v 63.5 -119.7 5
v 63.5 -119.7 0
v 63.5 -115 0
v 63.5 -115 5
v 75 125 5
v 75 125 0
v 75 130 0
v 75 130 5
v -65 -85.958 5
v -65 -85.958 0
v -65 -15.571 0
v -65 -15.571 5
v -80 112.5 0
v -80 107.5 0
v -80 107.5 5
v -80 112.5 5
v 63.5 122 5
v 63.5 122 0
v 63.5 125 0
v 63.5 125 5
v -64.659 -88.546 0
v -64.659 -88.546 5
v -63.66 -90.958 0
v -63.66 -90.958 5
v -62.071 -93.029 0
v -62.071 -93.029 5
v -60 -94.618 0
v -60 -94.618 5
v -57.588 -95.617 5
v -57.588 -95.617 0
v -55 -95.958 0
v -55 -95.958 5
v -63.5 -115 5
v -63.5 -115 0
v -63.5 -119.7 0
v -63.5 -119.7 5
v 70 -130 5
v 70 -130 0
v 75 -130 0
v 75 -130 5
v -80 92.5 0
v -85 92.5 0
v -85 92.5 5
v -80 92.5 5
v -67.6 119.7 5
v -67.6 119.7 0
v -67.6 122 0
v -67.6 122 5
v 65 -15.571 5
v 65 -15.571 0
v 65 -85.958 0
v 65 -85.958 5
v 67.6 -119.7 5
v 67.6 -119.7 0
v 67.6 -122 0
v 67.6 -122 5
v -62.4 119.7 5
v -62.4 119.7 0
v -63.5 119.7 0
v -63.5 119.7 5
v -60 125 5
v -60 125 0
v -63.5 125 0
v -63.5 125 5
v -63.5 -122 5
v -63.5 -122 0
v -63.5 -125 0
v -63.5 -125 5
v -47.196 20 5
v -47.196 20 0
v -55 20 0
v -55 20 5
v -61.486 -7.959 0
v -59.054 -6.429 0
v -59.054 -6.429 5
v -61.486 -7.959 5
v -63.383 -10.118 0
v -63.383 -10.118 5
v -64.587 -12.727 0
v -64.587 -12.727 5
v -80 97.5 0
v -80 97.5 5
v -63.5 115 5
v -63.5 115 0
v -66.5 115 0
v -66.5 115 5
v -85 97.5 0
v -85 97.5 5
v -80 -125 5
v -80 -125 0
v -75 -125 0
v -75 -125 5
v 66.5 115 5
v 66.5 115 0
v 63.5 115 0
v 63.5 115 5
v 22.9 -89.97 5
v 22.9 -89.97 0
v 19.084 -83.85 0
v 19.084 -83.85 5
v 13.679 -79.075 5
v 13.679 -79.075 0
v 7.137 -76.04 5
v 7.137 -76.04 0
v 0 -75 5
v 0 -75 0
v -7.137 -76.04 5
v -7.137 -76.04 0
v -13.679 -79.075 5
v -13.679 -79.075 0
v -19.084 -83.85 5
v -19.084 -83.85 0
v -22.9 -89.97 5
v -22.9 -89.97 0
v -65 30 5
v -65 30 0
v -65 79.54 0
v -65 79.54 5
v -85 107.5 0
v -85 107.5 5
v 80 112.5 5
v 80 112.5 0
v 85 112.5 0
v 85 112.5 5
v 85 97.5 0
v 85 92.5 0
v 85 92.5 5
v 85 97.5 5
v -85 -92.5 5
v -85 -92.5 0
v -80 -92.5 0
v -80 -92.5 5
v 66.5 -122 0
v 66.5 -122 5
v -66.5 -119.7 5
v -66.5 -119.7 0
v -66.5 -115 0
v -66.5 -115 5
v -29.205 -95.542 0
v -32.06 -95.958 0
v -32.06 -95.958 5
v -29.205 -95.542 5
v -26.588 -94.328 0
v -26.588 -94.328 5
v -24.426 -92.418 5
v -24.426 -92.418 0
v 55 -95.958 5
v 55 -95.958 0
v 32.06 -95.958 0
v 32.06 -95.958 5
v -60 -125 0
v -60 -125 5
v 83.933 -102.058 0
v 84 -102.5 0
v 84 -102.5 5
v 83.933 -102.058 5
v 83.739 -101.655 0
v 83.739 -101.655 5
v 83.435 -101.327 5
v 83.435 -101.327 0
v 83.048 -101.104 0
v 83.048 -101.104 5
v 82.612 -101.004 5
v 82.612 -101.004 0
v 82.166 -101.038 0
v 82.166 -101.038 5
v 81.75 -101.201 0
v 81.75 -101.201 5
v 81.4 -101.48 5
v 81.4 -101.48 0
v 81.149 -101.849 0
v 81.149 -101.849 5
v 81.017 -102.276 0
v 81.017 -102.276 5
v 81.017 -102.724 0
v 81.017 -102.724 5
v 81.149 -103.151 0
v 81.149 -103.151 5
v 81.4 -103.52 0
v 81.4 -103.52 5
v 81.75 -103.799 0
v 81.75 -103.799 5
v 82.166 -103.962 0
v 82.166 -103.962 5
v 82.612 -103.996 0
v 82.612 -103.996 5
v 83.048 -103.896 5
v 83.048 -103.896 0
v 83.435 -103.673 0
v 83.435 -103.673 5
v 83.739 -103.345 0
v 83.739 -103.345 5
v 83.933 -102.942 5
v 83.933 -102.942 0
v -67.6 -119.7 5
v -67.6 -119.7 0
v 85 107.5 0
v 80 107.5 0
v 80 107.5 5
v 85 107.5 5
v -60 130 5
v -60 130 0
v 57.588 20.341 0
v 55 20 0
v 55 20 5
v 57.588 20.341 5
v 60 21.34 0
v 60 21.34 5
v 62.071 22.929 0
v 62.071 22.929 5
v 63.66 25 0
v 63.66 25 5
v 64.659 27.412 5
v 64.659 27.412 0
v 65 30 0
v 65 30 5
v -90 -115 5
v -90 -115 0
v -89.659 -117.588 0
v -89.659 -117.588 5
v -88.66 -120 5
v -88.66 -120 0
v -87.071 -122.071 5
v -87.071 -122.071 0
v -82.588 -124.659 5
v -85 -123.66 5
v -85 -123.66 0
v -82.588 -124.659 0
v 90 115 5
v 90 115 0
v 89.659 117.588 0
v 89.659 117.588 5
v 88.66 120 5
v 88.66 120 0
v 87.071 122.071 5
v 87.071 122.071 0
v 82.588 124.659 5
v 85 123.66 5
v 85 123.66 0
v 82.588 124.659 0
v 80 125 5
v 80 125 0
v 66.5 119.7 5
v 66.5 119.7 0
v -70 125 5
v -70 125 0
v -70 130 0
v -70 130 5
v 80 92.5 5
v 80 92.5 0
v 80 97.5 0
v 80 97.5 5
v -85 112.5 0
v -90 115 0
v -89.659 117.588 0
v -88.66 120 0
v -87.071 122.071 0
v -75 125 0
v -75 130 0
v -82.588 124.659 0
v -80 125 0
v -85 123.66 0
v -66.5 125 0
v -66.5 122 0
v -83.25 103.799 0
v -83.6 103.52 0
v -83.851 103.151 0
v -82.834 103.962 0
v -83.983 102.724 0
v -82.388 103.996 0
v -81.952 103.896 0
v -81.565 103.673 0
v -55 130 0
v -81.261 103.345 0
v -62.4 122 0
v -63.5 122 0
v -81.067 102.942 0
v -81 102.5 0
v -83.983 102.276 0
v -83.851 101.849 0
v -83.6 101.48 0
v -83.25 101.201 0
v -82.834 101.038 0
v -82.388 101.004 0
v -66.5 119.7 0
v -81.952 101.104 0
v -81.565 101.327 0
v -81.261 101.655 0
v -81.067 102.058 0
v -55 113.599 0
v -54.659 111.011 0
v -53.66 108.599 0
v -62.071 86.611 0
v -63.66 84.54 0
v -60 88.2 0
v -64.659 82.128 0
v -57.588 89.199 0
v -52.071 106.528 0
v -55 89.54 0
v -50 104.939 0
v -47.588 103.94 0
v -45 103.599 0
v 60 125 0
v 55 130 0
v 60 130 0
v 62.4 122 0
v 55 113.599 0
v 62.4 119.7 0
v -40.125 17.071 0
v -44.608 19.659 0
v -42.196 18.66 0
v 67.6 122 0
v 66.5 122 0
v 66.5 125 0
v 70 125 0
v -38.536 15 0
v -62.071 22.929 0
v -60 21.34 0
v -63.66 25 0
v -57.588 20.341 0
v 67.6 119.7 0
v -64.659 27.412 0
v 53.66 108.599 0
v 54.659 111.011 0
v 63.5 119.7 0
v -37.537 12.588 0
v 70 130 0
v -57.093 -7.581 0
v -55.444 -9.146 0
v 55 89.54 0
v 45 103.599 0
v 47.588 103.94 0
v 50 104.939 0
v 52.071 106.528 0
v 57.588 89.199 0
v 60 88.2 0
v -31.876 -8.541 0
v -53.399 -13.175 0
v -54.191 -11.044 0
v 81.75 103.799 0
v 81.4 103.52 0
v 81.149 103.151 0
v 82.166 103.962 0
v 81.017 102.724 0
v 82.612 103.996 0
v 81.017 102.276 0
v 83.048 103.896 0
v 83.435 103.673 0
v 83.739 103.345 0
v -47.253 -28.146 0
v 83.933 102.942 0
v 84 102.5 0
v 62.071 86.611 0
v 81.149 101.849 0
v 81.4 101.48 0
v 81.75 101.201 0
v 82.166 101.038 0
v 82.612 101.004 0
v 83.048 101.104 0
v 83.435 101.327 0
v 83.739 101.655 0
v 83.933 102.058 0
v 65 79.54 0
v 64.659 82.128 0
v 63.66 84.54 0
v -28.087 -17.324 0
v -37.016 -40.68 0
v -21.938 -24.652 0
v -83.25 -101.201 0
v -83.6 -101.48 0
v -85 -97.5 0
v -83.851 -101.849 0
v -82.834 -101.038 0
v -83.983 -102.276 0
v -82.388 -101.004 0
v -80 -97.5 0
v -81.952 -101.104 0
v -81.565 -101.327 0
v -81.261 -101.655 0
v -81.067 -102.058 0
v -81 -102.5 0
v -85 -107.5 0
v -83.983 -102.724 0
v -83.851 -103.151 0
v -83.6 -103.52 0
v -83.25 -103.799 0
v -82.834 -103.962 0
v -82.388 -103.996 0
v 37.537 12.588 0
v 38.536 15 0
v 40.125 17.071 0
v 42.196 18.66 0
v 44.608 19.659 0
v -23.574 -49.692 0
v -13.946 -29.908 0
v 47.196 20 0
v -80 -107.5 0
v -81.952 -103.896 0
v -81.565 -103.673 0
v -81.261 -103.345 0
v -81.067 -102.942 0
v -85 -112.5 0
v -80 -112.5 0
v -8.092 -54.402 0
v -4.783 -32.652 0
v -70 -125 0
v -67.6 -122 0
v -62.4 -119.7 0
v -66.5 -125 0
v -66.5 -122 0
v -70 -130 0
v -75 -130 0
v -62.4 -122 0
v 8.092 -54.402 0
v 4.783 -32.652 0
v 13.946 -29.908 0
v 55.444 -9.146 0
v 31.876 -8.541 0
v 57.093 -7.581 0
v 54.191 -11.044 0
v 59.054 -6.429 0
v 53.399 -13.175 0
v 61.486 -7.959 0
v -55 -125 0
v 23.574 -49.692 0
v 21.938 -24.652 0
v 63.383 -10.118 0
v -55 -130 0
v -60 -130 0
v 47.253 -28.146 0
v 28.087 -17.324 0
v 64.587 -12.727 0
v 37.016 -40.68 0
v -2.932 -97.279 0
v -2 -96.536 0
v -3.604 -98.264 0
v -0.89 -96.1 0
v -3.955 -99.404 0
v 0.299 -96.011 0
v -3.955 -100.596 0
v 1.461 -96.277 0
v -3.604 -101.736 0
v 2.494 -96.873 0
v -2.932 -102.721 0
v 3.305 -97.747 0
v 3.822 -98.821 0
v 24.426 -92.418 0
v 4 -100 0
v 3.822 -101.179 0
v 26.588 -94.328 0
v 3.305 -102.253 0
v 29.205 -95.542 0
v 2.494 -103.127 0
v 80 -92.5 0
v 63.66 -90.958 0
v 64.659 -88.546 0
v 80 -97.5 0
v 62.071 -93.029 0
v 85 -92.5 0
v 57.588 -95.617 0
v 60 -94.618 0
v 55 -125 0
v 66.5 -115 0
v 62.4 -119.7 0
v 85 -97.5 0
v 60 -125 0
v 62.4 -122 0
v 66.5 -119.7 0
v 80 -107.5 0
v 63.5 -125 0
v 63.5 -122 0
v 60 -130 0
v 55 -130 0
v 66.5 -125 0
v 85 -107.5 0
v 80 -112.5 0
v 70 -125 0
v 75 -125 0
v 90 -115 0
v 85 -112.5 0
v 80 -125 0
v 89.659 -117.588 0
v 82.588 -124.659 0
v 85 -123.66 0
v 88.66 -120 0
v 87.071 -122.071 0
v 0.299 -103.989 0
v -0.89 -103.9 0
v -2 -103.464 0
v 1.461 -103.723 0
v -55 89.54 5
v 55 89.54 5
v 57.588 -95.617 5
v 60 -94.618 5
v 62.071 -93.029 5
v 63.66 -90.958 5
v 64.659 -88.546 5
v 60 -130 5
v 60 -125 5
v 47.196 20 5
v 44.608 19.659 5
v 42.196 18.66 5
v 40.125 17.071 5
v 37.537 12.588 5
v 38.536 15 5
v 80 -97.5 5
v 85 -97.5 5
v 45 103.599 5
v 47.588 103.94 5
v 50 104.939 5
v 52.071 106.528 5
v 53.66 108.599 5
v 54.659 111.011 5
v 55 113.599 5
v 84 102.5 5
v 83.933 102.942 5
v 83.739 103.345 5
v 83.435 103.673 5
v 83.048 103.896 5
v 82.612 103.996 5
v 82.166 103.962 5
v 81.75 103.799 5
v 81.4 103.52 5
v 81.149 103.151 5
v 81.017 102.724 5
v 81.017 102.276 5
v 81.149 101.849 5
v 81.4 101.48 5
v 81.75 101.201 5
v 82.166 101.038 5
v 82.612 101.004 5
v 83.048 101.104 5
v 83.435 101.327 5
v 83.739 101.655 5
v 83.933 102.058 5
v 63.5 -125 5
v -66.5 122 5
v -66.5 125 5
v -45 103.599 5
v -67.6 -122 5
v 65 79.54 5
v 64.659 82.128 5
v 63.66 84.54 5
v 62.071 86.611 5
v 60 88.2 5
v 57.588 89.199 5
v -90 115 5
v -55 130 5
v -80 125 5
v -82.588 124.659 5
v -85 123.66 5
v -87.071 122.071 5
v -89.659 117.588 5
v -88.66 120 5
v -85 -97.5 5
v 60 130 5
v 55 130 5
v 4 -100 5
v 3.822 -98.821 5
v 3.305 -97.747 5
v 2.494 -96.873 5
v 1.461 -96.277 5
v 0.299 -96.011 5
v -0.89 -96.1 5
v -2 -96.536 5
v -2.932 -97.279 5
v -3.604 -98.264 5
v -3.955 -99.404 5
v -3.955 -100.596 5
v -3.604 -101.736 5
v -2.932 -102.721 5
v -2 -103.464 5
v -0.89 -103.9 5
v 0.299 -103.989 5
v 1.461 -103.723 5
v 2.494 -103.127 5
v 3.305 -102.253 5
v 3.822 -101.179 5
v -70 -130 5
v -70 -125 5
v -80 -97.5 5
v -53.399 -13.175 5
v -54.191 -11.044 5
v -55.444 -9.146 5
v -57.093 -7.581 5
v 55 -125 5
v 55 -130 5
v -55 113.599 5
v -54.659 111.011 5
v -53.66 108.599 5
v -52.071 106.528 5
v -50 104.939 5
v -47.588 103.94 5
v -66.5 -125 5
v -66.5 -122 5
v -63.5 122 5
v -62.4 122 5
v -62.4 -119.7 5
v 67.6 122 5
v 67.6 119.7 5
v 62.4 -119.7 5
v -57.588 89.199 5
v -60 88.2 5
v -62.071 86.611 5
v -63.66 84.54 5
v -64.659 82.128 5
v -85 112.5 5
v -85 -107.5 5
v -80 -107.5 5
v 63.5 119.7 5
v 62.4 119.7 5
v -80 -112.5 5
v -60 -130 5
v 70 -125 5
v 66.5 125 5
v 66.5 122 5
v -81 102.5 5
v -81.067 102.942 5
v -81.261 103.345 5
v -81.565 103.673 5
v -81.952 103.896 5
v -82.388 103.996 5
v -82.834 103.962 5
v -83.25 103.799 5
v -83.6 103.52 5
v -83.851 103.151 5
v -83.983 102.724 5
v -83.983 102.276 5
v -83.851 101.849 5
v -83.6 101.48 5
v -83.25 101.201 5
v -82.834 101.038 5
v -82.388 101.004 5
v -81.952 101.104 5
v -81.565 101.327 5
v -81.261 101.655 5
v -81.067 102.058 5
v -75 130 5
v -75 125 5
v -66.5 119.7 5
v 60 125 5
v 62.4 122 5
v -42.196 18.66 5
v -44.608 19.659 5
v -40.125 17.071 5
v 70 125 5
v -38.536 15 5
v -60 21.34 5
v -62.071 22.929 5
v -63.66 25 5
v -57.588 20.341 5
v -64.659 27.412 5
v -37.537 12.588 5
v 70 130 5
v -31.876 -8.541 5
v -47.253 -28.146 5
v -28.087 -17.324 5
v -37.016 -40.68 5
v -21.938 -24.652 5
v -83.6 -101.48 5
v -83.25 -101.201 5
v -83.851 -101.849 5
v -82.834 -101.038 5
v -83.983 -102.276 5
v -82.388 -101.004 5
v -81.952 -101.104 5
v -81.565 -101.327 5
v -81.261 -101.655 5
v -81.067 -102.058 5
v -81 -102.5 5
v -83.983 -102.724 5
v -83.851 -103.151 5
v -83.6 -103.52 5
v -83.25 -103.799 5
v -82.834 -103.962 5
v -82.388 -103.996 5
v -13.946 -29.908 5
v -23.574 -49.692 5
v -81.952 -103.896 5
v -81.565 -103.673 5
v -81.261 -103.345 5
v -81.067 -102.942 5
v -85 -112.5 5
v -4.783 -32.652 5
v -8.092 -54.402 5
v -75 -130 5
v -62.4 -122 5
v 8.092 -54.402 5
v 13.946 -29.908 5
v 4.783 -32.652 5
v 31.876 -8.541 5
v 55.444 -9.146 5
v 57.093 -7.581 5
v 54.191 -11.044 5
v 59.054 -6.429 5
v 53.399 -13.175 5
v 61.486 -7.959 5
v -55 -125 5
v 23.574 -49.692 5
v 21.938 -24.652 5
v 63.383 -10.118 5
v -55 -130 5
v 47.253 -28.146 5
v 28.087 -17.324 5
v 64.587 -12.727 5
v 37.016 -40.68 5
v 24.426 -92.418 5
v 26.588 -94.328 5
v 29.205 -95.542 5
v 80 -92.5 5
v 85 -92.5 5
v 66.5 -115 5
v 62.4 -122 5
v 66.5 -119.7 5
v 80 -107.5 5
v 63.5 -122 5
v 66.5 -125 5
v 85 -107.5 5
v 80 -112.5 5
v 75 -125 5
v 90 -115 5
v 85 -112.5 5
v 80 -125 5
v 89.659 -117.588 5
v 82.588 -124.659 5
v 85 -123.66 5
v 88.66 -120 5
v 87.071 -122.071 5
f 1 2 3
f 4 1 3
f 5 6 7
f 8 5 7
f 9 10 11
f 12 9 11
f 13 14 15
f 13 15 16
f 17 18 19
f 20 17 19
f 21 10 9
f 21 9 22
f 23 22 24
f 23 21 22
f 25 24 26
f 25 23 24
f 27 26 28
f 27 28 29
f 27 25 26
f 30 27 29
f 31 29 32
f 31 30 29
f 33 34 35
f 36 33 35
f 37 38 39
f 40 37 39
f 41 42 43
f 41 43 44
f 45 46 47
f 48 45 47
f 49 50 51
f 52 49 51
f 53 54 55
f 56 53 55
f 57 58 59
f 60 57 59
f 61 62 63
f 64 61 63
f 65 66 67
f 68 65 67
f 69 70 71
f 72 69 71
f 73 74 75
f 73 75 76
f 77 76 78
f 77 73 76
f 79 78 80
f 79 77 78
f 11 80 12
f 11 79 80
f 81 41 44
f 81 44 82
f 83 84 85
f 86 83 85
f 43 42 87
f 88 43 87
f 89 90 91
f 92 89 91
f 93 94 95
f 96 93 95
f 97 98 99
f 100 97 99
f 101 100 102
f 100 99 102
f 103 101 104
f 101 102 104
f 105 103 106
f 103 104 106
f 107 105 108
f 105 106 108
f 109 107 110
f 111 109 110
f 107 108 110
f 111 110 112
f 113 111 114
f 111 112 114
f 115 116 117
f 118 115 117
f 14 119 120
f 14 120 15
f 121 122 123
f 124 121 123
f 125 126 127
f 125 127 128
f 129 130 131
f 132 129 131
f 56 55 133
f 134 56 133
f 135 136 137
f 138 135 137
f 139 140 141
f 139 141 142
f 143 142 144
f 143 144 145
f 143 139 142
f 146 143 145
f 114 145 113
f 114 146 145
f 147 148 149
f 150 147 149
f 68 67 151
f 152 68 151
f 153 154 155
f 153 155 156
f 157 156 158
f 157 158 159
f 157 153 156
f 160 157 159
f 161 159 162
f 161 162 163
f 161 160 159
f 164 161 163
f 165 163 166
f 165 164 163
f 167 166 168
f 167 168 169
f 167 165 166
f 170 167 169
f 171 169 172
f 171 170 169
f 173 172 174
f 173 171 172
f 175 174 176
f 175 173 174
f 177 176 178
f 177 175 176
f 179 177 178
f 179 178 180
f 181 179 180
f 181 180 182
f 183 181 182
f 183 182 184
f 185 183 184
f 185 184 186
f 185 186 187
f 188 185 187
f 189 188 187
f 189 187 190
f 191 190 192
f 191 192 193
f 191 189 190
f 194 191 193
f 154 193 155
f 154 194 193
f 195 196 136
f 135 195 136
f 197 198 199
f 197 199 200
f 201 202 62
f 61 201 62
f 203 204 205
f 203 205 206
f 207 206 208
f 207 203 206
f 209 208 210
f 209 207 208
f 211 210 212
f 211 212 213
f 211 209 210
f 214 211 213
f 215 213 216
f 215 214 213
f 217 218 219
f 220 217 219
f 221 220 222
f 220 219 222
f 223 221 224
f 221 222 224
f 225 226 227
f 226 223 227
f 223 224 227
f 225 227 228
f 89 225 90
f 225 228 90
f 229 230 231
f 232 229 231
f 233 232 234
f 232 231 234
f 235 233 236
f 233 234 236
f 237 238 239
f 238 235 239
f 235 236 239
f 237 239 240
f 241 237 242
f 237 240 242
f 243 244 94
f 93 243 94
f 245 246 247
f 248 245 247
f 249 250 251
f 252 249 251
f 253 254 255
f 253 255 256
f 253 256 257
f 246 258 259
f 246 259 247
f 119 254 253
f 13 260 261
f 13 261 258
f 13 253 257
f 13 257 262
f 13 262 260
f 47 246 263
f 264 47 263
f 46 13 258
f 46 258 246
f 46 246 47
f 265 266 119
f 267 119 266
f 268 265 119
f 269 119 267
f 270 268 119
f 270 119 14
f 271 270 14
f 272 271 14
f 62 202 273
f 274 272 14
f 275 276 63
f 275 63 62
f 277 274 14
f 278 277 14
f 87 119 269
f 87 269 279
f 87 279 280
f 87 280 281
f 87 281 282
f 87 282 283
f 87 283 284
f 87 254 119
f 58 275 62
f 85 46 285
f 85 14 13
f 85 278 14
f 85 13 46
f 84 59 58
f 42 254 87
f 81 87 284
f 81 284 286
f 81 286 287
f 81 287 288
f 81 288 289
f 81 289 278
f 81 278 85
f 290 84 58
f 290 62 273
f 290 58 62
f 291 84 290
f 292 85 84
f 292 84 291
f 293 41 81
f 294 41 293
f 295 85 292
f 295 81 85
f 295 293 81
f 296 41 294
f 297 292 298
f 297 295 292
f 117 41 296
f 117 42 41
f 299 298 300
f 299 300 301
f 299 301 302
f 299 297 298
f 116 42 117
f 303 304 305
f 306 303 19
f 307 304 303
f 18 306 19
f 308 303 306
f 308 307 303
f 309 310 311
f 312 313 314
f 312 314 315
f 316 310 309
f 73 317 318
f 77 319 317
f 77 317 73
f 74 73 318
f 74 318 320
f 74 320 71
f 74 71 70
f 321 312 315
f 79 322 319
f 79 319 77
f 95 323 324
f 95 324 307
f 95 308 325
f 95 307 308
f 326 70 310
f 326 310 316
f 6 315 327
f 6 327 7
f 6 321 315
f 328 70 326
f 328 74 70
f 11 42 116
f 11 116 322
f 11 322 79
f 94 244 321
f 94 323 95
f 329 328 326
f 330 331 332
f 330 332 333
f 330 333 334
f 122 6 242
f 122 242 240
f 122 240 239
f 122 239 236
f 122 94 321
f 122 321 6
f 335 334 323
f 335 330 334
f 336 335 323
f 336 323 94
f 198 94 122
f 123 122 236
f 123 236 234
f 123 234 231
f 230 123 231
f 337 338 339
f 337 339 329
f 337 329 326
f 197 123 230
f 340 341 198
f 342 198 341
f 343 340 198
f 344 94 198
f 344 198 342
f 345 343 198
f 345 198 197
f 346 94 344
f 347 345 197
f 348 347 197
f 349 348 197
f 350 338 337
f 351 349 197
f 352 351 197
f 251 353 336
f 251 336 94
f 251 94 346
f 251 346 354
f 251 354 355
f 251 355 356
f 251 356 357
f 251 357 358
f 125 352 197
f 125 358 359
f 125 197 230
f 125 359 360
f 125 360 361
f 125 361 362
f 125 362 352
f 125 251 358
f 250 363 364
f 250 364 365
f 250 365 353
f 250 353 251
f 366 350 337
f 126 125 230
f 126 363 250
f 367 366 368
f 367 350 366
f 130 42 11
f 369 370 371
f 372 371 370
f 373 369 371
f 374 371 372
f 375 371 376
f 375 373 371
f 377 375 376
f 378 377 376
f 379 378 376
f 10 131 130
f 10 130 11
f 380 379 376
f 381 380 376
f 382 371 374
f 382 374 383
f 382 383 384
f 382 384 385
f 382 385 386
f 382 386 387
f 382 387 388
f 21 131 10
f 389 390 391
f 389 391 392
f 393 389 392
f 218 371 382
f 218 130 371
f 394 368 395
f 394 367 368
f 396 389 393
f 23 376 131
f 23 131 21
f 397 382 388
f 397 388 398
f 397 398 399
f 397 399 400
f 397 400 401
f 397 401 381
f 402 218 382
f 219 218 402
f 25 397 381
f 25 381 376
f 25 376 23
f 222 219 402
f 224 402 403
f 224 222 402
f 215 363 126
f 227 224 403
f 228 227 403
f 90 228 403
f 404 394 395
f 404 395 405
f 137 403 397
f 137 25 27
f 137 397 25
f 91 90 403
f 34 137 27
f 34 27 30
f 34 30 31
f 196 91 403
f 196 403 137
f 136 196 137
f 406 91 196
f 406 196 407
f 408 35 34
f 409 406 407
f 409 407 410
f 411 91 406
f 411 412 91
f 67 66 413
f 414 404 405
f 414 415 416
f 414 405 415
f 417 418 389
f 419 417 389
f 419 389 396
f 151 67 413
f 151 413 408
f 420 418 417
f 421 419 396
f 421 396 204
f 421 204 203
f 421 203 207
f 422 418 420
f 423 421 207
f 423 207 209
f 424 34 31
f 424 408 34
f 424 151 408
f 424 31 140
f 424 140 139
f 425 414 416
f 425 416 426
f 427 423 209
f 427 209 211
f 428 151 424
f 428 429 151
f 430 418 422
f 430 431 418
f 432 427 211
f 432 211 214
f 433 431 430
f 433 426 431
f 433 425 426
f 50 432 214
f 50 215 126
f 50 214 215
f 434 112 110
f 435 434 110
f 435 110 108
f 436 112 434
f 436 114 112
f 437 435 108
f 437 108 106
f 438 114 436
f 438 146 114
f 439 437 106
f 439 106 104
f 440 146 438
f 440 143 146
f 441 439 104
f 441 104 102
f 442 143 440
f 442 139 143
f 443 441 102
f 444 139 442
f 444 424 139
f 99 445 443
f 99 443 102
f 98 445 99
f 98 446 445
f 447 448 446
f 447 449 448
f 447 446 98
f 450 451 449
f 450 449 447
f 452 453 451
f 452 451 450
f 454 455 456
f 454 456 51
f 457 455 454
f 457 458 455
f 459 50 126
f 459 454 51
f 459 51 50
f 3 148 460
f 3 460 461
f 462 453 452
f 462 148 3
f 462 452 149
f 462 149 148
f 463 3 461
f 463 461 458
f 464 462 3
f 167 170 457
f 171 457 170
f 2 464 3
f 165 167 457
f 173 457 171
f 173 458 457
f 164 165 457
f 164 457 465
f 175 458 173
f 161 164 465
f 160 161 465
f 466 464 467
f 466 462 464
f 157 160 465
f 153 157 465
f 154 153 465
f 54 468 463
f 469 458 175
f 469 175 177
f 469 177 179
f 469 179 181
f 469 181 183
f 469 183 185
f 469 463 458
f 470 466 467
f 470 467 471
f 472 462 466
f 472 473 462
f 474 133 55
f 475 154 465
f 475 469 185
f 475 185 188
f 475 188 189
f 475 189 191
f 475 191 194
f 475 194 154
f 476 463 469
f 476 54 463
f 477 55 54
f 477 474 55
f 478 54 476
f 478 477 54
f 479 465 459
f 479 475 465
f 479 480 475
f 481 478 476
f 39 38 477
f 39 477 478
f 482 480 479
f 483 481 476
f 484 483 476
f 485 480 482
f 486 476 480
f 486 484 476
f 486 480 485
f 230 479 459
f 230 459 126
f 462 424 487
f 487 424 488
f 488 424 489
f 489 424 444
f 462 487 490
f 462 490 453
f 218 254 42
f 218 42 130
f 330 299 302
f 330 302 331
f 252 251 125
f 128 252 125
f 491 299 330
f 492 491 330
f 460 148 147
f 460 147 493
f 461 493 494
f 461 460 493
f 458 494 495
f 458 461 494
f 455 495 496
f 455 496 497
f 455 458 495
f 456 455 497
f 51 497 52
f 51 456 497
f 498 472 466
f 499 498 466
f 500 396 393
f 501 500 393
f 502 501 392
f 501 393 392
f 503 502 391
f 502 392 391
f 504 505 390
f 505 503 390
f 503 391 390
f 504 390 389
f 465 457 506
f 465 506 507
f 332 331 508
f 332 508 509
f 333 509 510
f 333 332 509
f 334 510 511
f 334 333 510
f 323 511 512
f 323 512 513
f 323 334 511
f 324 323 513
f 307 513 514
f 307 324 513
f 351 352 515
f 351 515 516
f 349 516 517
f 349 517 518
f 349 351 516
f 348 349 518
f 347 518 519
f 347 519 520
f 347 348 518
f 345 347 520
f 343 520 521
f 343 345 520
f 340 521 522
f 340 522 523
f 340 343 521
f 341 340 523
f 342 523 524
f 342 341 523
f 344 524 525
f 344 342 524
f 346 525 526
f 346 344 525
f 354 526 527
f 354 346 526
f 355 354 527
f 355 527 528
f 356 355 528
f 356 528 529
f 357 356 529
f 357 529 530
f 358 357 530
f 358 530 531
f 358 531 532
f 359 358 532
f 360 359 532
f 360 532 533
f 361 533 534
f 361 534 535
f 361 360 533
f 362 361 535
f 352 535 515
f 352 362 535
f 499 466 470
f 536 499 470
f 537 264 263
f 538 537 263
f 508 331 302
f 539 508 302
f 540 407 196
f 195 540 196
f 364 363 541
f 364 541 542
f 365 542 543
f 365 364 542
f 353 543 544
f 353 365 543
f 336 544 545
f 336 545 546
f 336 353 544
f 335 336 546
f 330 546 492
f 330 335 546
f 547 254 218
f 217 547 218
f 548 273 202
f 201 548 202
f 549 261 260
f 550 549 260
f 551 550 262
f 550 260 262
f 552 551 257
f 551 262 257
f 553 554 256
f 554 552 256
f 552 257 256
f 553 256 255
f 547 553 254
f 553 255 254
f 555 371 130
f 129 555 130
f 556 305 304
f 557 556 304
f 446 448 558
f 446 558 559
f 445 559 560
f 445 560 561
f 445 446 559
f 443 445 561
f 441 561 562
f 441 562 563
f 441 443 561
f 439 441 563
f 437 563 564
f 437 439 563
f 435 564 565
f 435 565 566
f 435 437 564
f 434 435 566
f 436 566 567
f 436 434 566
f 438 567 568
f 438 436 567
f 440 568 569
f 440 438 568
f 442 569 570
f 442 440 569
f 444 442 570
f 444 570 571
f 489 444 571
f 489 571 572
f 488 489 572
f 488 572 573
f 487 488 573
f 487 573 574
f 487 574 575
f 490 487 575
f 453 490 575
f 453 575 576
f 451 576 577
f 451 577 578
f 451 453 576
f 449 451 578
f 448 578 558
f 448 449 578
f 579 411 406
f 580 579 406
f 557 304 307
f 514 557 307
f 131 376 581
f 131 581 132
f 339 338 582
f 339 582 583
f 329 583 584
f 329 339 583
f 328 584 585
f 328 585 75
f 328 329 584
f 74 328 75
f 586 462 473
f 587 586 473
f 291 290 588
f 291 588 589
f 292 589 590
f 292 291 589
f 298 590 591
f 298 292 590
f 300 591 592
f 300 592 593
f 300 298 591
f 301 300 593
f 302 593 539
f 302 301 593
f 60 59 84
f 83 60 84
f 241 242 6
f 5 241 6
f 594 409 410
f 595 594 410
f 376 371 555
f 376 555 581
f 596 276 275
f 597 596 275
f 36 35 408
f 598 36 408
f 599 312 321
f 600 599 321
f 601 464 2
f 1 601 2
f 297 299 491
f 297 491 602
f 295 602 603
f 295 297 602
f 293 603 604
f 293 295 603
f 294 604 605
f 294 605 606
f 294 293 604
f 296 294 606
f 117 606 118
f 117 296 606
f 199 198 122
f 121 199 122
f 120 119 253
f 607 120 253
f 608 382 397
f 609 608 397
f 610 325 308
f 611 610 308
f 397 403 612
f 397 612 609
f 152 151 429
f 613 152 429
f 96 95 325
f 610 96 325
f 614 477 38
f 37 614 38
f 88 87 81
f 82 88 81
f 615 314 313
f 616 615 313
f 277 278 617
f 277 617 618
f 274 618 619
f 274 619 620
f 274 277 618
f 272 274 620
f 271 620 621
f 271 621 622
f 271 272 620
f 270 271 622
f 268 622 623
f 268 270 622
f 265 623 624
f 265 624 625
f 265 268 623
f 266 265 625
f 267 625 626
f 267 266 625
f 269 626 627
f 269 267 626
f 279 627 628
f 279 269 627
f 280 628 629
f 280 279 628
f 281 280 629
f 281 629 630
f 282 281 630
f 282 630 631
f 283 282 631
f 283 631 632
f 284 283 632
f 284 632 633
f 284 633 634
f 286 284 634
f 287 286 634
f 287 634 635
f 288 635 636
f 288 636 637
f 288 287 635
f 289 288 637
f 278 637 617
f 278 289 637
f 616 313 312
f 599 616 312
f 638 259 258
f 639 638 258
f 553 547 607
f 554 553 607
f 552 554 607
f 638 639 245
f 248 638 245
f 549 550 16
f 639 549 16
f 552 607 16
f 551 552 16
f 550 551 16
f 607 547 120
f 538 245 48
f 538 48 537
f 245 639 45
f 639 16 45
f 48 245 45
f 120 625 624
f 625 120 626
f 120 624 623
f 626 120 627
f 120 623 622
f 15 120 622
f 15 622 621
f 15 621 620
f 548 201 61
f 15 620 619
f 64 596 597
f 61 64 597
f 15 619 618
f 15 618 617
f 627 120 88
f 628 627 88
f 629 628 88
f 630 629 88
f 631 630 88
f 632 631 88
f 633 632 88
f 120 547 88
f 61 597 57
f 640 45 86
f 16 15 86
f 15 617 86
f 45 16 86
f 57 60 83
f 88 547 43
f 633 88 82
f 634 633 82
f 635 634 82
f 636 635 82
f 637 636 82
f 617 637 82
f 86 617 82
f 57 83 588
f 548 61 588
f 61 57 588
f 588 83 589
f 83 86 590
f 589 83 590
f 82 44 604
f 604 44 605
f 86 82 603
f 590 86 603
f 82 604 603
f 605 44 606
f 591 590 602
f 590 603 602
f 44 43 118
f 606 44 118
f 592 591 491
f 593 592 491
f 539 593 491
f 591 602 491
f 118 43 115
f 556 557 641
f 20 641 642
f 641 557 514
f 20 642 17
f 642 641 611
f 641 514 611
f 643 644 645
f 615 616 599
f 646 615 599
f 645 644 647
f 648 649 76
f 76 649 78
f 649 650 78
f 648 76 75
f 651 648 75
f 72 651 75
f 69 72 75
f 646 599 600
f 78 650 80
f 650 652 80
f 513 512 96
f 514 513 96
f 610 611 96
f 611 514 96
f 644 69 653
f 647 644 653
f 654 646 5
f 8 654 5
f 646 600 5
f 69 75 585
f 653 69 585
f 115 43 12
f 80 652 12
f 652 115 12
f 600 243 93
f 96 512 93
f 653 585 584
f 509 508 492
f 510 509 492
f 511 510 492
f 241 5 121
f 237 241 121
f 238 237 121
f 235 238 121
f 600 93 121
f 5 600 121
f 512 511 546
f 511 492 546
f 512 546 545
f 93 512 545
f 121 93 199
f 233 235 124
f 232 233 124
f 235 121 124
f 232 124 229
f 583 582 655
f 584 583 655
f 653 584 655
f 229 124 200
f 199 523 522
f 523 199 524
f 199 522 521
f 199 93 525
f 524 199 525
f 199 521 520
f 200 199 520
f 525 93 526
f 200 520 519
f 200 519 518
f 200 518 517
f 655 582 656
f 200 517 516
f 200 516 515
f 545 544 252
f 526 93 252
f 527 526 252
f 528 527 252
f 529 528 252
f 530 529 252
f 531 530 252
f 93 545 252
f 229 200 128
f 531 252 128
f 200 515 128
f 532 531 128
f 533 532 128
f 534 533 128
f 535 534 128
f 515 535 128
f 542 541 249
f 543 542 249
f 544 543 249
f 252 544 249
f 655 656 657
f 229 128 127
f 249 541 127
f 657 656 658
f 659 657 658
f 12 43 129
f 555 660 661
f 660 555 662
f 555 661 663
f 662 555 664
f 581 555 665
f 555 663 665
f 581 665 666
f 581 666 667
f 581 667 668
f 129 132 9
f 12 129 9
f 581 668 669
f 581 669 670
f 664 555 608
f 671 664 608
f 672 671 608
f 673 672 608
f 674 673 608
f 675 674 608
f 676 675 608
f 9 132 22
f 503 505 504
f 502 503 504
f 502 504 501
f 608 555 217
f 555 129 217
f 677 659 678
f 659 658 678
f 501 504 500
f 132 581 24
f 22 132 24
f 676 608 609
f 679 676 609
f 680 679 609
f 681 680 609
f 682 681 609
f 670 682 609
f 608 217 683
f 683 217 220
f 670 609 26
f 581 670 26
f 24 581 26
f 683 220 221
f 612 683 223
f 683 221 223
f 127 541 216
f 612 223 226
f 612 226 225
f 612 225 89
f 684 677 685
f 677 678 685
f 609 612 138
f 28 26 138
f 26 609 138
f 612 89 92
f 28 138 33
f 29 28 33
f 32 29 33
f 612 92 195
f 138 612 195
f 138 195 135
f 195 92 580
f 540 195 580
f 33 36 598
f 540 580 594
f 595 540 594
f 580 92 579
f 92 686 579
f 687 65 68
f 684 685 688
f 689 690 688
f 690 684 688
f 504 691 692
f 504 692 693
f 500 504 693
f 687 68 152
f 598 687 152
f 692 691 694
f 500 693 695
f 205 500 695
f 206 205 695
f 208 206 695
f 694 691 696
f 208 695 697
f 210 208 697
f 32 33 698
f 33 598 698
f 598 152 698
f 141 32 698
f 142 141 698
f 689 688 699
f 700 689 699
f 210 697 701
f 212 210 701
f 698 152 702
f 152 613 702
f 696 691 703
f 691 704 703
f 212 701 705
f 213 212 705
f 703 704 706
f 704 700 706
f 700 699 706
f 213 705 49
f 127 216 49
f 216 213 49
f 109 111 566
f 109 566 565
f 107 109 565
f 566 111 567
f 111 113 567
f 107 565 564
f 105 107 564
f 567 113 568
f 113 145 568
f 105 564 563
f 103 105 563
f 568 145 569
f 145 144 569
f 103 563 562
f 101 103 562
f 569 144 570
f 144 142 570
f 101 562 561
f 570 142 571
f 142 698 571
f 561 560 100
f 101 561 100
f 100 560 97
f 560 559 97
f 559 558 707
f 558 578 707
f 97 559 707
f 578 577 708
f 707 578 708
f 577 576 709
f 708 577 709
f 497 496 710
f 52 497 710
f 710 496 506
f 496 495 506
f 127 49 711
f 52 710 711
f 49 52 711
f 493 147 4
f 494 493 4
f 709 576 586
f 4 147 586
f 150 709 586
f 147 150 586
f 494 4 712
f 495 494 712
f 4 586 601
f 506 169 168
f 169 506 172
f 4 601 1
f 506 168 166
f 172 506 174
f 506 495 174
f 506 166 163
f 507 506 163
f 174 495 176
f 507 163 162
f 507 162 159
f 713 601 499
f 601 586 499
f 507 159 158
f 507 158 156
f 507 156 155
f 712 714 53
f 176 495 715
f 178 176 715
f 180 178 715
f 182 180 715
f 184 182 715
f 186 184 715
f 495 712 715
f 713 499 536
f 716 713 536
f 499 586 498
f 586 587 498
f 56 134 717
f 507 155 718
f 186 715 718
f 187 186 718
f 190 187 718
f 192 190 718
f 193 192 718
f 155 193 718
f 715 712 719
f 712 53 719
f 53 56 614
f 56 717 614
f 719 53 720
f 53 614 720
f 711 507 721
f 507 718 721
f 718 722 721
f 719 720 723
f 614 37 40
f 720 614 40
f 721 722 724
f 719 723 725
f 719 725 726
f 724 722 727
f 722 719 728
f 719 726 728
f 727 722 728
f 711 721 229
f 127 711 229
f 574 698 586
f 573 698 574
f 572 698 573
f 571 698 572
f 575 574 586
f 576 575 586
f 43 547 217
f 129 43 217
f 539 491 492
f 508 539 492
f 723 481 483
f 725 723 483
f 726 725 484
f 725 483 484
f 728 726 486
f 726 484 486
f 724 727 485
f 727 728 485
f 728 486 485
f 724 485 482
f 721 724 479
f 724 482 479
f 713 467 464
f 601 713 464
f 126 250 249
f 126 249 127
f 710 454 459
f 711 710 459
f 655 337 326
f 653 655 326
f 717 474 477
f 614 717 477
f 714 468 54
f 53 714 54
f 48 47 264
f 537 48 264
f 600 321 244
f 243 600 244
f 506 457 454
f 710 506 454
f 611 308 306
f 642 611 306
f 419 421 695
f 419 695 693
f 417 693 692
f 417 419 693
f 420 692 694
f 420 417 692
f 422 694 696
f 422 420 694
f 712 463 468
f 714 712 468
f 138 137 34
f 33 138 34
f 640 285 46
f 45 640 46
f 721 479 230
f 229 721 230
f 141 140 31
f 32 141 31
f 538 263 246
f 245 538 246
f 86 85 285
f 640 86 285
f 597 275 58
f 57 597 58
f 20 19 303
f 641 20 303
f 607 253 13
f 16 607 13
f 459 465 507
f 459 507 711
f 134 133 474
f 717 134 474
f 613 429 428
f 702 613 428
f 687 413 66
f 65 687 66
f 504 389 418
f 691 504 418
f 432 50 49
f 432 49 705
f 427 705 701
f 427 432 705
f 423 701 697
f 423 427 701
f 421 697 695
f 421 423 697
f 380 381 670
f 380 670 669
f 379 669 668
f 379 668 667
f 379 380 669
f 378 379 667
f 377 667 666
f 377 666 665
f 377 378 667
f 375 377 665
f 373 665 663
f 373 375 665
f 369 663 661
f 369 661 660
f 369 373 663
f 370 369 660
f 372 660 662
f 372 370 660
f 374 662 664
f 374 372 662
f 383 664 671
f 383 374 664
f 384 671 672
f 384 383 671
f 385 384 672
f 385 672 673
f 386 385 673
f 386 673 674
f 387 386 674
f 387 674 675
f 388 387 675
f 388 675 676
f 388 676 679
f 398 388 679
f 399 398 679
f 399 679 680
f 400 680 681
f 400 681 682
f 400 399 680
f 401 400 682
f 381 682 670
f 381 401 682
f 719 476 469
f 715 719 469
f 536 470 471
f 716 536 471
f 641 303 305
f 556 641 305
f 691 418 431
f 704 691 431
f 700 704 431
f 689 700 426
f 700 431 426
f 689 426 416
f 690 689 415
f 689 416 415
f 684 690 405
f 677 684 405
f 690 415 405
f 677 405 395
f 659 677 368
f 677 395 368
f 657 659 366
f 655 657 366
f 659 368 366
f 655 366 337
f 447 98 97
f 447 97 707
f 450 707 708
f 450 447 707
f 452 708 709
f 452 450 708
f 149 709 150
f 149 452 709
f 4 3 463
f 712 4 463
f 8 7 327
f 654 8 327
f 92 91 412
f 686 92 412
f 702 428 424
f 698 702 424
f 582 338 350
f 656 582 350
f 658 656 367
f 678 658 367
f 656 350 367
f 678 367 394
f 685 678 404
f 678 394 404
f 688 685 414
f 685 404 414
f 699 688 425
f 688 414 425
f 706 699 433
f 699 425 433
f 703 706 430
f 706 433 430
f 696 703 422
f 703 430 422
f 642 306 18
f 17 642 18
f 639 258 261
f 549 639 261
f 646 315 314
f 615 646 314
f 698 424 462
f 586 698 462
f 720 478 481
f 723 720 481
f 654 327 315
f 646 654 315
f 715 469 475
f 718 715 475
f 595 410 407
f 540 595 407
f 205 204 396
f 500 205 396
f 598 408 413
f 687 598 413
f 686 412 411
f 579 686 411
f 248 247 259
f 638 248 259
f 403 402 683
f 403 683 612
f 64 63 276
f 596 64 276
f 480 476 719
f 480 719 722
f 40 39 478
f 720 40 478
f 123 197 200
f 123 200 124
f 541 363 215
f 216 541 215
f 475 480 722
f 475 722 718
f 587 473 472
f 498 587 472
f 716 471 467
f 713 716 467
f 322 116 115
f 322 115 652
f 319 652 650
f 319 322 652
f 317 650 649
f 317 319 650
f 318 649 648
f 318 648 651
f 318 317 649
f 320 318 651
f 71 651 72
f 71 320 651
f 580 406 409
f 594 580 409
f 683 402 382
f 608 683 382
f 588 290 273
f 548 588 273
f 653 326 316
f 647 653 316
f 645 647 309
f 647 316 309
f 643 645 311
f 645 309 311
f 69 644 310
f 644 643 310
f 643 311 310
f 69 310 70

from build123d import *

# Parameters (mm, degrees)
SKETCH1_W           = 5
SKETCH1_H           = 5
SKETCH1_R           = 1.5
SKETCH1_R_2         = 4
BOSS_EXTRUDE1_DEPTH = 5
FILLET1_R           = 10


with BuildPart() as part:
    # Sketch1 → Boss-Extrude1 (new body)
    with BuildSketch(Plane.XY):
        Polygon((-75, 125), (-90, 125), (-90, -125), (-75, -125), (-75, -130), (-70, -130), (-70, -125), (-66.5, -125), (-66.5, -122), (-67.6, -122), (-67.6, -119.7), (-66.5, -119.7), (-66.5, -115), (-63.5, -115), (-63.5, -119.7), (-62.4, -119.7), (-62.4, -122), (-63.5, -122), (-63.5, -125), (-60, -125), (-60, -130), (-55, -130), (-55, -125), (55, -125), (55, -130), (60, -130), (60, -125), (63.5, -125), (63.5, -122), (62.4, -122), (62.4, -119.7), (63.5, -119.7), (63.5, -115), (66.5, -115), (66.5, -119.7), (67.6, -119.7), (67.6, -122), (66.5, -122), (66.5, -125), (70, -125), (70, -130), (75, -130), (75, -125), (90, -125), (90, 125), (75, 125), (75, 130), (70, 130), (70, 125), (66.5, 125), (66.5, 122), (67.6, 122), (67.6, 119.7), (66.5, 119.7), (66.5, 115), (63.5, 115), (63.5, 119.7), (62.4, 119.7), (62.4, 122), (63.5, 122), (63.5, 125), (60, 125), (60, 130), (55, 130), (55, 103.598832104), (-55, 103.598832104), (-55, 130), (-60, 130), (-60, 125), (-63.5, 125), (-63.5, 122), (-62.4, 122), (-62.4, 119.7), (-63.5, 119.7), (-63.5, 115), (-66.5, 115), (-66.5, 119.7), (-67.6, 119.7), (-67.6, 122), (-66.5, 122), (-66.5, 125), (-70, 125), (-70, 130), (-75, 130), align=None)
        with Locations((-82.5, -110)):
            Rectangle(SKETCH1_W, SKETCH1_H, mode=Mode.SUBTRACT)
        with Locations((-82.5, -102.5)):
            Circle(SKETCH1_R, mode=Mode.SUBTRACT)
        with Locations((-82.5, -95)):
            Rectangle(SKETCH1_W, SKETCH1_H, mode=Mode.SUBTRACT)
        with Locations((0, -100)):
            Circle(SKETCH1_R_2, mode=Mode.SUBTRACT)
        with Locations((82.5, -110)):
            Rectangle(SKETCH1_W, SKETCH1_H, mode=Mode.SUBTRACT)
        with Locations((82.5, -102.5)):
            Circle(SKETCH1_R, mode=Mode.SUBTRACT)
        with Locations((82.5, -95)):
            Rectangle(SKETCH1_W, SKETCH1_H, mode=Mode.SUBTRACT)
        with BuildLine():
            Line((-65, -5.570672252), (-54.717160111, -5.570672252))
            ThreePointArc((-54.717160111, -5.570672252), (0, -55), (54.717160111, -5.570672252))
            Line((54.717160111, -5.570672252), (65, -5.570672252))
            Line((65, -5.570672252), (65, -95.958016924))
            Line((65, -95.958016924), (24.671083738, -95.958016924))
            ThreePointArc((24.671083738, -95.958016924), (0, -75), (-24.671083738, -95.958016924))
            Line((-24.671083738, -95.958016924), (-65, -95.958016924))
            Line((-65, -95.958016924), (-65, -5.570672252))
        make_face(mode=Mode.SUBTRACT)
        with Locations((-82.5, 95)):
            Rectangle(SKETCH1_W, SKETCH1_H, mode=Mode.SUBTRACT)
        with Locations((-82.5, 102.5)):
            Circle(SKETCH1_R, mode=Mode.SUBTRACT)
        with Locations((-82.5, 110)):
            Rectangle(SKETCH1_W, SKETCH1_H, mode=Mode.SUBTRACT)
        with BuildLine():
            ThreePointArc((31.875552268, -8.541028488), (0, -33), (-31.875552268, -8.541028488))
            Line((-31.875552268, -8.541028488), (-39.523097802, 20))
            Line((-39.523097802, 20), (-65, 20))
            Line((-65, 20), (-65, 89.539551807))
            Line((-65, 89.539551807), (65, 89.539551807))
            Line((65, 89.539551807), (65, 20))
            Line((65, 20), (39.523097802, 20))
            Line((39.523097802, 20), (31.875552268, -8.541028488))
        make_face(mode=Mode.SUBTRACT)
        with Locations((82.5, 95)):
            Rectangle(SKETCH1_W, SKETCH1_H, mode=Mode.SUBTRACT)
        with Locations((82.5, 102.5)):
            Circle(SKETCH1_R, mode=Mode.SUBTRACT)
        with Locations((82.5, 110)):
            Rectangle(SKETCH1_W, SKETCH1_H, mode=Mode.SUBTRACT)
    extrude(amount=BOSS_EXTRUDE1_DEPTH)

    # Fillet1
    # the kernel refuses this fillet: 10 mm, written as the material it adds along each edge
    with BuildSketch(Plane(origin=(-55, 103.598832104, 0), x_dir=(1, 0, 0), z_dir=(0, 0, 1)), Plane(origin=(55, 103.598832104, 0), x_dir=(0, 1, 0), z_dir=(0, 0, 1)), Plane(origin=(-65, -95.958016924, 0), x_dir=(1, 0, 0), z_dir=(0, 0, 1)), Plane(origin=(65, -95.958016924, 0), x_dir=(0, 1, 0), z_dir=(0, 0, 1)), Plane(origin=(65, -5.570672252, 0), x_dir=(-1, 0, 0), z_dir=(0, 0, 1)), Plane(origin=(-65, -5.570672252, 0), x_dir=(0, -1, 0), z_dir=(0, 0, 1)), Plane(origin=(65, 89.539551807, 0), x_dir=(-1, 0, 0), z_dir=(0, 0, 1)), Plane(origin=(-65, 89.539551807, 0), x_dir=(0, -1, 0), z_dir=(0, 0, 1)), Plane(origin=(65, 20, 0), x_dir=(0, 1, 0), z_dir=(0, 0, 1)), Plane(origin=(-65, 20, 0), x_dir=(1, 0, 0), z_dir=(0, 0, 1))) as fillet1_piece_1:
        with BuildLine():
            CenterArc((FILLET1_R, FILLET1_R), FILLET1_R, 180, 90)
            Line((0, FILLET1_R), (0, 0))
            Line((0, 0), (FILLET1_R, 0))
        make_face()
    extrude(amount=5)
    with BuildSketch(Plane(origin=(24.671083738, -95.958016924, 0), x_dir=(1, 0, 0), z_dir=(0, 0, 1))) as fillet1_piece_2:
        with BuildLine():
            CenterArc((7.388590485, 10), FILLET1_R, 203.653187484, 66.346812516)
            ThreePointArc((-1.771316436, 5.988004835), (-0.697963006, 3.049524687), (0, 0))
            Line((0, 0), (7.388590485, 0))
        make_face()
    extrude(amount=5)
    with BuildSketch(Plane(origin=(-24.671083738, -95.958016924, 0), x_dir=(-1, 0, 0), z_dir=(0, 0, 1))) as fillet1_piece_3:
        with BuildLine():
            CenterArc((7.388590485, -10), FILLET1_R, 90, 66.346812516)
            ThreePointArc((-1.771316436, -5.988004835), (-0.697963006, -3.049524687), (0, 0))
            Line((0, 0), (7.388590485, 0))
        make_face()
    extrude(amount=5)
    with BuildSketch(Plane(origin=(54.717160111, -5.570672252, 0), x_dir=(-0.17083790481511615, -0.9852991476086749, 0), z_dir=(0, 0, 1))) as fillet1_piece_4:
        with BuildLine():
            CenterArc((8.419606625, 9.975355126), FILLET1_R, 189.836540175, 76.140088059)
            Line((-1.433384851, 8.266976078), (0, 0))
            ThreePointArc((0, 0), (3.85898637, 0.135546807), (7.717972739, 0))
        make_face()
    extrude(amount=5)
    with BuildSketch(Plane(origin=(-54.717160111, -5.570672252, 0), x_dir=(-1, 0, 0), z_dir=(0, 0, 1))) as fillet1_piece_5:
        with BuildLine():
            CenterArc((8.390320948, 10), FILLET1_R, 193.859911941, 76.140088059)
            ThreePointArc((-1.318522292, 7.604511961), (-0.525706993, 3.825412513), (0, 0))
            Line((0, 0), (8.390320948, 0))
        make_face()
    extrude(amount=5)
    # the kernel refuses this fillet: 10 mm, written as the material it takes off along each edge
    with BuildSketch(Plane(origin=(-90, -125, -25), x_dir=(0, 1, 0), z_dir=(0, 0, 1)), Plane(origin=(90, -125, -25), x_dir=(-1, 0, 0), z_dir=(0, 0, 1)), Plane(origin=(-90, 125, -25), x_dir=(1, 0, 0), z_dir=(0, 0, 1)), Plane(origin=(90, 125, -25), x_dir=(0, -1, 0), z_dir=(0, 0, 1))) as fillet1_2_piece_1:
        with BuildLine():
            CenterArc((FILLET1_R, -FILLET1_R), FILLET1_R, 90, 90)
            Line((0, -FILLET1_R), (0, 0))
            Line((0, 0), (FILLET1_R, 0))
        make_face()
    extrude(amount=55, mode=Mode.SUBTRACT)
    with BuildSketch(Plane(origin=(39.523097802, 20, -19.183174699), x_dir=(1, 0, 0), z_dir=(0, 0, 1)), Plane(origin=(-39.523097802, 20, -19.183174699), x_dir=(0.2588190451025106, -0.9659258262890711, 0), z_dir=(0, 0, 1))) as fillet1_2_piece_2:
        with BuildLine():
            CenterArc((FILLET1_R * 0.767326987979, -FILLET1_R), FILLET1_R, 90, 75)
            Line((-FILLET1_R * 0.19859883831, -FILLET1_R * 0.741180954897), (0, 0))
            Line((0, 0), (FILLET1_R * 0.767326987979, 0))
        make_face()
    extrude(amount=43.366349399, mode=Mode.SUBTRACT)


solid = part.part
